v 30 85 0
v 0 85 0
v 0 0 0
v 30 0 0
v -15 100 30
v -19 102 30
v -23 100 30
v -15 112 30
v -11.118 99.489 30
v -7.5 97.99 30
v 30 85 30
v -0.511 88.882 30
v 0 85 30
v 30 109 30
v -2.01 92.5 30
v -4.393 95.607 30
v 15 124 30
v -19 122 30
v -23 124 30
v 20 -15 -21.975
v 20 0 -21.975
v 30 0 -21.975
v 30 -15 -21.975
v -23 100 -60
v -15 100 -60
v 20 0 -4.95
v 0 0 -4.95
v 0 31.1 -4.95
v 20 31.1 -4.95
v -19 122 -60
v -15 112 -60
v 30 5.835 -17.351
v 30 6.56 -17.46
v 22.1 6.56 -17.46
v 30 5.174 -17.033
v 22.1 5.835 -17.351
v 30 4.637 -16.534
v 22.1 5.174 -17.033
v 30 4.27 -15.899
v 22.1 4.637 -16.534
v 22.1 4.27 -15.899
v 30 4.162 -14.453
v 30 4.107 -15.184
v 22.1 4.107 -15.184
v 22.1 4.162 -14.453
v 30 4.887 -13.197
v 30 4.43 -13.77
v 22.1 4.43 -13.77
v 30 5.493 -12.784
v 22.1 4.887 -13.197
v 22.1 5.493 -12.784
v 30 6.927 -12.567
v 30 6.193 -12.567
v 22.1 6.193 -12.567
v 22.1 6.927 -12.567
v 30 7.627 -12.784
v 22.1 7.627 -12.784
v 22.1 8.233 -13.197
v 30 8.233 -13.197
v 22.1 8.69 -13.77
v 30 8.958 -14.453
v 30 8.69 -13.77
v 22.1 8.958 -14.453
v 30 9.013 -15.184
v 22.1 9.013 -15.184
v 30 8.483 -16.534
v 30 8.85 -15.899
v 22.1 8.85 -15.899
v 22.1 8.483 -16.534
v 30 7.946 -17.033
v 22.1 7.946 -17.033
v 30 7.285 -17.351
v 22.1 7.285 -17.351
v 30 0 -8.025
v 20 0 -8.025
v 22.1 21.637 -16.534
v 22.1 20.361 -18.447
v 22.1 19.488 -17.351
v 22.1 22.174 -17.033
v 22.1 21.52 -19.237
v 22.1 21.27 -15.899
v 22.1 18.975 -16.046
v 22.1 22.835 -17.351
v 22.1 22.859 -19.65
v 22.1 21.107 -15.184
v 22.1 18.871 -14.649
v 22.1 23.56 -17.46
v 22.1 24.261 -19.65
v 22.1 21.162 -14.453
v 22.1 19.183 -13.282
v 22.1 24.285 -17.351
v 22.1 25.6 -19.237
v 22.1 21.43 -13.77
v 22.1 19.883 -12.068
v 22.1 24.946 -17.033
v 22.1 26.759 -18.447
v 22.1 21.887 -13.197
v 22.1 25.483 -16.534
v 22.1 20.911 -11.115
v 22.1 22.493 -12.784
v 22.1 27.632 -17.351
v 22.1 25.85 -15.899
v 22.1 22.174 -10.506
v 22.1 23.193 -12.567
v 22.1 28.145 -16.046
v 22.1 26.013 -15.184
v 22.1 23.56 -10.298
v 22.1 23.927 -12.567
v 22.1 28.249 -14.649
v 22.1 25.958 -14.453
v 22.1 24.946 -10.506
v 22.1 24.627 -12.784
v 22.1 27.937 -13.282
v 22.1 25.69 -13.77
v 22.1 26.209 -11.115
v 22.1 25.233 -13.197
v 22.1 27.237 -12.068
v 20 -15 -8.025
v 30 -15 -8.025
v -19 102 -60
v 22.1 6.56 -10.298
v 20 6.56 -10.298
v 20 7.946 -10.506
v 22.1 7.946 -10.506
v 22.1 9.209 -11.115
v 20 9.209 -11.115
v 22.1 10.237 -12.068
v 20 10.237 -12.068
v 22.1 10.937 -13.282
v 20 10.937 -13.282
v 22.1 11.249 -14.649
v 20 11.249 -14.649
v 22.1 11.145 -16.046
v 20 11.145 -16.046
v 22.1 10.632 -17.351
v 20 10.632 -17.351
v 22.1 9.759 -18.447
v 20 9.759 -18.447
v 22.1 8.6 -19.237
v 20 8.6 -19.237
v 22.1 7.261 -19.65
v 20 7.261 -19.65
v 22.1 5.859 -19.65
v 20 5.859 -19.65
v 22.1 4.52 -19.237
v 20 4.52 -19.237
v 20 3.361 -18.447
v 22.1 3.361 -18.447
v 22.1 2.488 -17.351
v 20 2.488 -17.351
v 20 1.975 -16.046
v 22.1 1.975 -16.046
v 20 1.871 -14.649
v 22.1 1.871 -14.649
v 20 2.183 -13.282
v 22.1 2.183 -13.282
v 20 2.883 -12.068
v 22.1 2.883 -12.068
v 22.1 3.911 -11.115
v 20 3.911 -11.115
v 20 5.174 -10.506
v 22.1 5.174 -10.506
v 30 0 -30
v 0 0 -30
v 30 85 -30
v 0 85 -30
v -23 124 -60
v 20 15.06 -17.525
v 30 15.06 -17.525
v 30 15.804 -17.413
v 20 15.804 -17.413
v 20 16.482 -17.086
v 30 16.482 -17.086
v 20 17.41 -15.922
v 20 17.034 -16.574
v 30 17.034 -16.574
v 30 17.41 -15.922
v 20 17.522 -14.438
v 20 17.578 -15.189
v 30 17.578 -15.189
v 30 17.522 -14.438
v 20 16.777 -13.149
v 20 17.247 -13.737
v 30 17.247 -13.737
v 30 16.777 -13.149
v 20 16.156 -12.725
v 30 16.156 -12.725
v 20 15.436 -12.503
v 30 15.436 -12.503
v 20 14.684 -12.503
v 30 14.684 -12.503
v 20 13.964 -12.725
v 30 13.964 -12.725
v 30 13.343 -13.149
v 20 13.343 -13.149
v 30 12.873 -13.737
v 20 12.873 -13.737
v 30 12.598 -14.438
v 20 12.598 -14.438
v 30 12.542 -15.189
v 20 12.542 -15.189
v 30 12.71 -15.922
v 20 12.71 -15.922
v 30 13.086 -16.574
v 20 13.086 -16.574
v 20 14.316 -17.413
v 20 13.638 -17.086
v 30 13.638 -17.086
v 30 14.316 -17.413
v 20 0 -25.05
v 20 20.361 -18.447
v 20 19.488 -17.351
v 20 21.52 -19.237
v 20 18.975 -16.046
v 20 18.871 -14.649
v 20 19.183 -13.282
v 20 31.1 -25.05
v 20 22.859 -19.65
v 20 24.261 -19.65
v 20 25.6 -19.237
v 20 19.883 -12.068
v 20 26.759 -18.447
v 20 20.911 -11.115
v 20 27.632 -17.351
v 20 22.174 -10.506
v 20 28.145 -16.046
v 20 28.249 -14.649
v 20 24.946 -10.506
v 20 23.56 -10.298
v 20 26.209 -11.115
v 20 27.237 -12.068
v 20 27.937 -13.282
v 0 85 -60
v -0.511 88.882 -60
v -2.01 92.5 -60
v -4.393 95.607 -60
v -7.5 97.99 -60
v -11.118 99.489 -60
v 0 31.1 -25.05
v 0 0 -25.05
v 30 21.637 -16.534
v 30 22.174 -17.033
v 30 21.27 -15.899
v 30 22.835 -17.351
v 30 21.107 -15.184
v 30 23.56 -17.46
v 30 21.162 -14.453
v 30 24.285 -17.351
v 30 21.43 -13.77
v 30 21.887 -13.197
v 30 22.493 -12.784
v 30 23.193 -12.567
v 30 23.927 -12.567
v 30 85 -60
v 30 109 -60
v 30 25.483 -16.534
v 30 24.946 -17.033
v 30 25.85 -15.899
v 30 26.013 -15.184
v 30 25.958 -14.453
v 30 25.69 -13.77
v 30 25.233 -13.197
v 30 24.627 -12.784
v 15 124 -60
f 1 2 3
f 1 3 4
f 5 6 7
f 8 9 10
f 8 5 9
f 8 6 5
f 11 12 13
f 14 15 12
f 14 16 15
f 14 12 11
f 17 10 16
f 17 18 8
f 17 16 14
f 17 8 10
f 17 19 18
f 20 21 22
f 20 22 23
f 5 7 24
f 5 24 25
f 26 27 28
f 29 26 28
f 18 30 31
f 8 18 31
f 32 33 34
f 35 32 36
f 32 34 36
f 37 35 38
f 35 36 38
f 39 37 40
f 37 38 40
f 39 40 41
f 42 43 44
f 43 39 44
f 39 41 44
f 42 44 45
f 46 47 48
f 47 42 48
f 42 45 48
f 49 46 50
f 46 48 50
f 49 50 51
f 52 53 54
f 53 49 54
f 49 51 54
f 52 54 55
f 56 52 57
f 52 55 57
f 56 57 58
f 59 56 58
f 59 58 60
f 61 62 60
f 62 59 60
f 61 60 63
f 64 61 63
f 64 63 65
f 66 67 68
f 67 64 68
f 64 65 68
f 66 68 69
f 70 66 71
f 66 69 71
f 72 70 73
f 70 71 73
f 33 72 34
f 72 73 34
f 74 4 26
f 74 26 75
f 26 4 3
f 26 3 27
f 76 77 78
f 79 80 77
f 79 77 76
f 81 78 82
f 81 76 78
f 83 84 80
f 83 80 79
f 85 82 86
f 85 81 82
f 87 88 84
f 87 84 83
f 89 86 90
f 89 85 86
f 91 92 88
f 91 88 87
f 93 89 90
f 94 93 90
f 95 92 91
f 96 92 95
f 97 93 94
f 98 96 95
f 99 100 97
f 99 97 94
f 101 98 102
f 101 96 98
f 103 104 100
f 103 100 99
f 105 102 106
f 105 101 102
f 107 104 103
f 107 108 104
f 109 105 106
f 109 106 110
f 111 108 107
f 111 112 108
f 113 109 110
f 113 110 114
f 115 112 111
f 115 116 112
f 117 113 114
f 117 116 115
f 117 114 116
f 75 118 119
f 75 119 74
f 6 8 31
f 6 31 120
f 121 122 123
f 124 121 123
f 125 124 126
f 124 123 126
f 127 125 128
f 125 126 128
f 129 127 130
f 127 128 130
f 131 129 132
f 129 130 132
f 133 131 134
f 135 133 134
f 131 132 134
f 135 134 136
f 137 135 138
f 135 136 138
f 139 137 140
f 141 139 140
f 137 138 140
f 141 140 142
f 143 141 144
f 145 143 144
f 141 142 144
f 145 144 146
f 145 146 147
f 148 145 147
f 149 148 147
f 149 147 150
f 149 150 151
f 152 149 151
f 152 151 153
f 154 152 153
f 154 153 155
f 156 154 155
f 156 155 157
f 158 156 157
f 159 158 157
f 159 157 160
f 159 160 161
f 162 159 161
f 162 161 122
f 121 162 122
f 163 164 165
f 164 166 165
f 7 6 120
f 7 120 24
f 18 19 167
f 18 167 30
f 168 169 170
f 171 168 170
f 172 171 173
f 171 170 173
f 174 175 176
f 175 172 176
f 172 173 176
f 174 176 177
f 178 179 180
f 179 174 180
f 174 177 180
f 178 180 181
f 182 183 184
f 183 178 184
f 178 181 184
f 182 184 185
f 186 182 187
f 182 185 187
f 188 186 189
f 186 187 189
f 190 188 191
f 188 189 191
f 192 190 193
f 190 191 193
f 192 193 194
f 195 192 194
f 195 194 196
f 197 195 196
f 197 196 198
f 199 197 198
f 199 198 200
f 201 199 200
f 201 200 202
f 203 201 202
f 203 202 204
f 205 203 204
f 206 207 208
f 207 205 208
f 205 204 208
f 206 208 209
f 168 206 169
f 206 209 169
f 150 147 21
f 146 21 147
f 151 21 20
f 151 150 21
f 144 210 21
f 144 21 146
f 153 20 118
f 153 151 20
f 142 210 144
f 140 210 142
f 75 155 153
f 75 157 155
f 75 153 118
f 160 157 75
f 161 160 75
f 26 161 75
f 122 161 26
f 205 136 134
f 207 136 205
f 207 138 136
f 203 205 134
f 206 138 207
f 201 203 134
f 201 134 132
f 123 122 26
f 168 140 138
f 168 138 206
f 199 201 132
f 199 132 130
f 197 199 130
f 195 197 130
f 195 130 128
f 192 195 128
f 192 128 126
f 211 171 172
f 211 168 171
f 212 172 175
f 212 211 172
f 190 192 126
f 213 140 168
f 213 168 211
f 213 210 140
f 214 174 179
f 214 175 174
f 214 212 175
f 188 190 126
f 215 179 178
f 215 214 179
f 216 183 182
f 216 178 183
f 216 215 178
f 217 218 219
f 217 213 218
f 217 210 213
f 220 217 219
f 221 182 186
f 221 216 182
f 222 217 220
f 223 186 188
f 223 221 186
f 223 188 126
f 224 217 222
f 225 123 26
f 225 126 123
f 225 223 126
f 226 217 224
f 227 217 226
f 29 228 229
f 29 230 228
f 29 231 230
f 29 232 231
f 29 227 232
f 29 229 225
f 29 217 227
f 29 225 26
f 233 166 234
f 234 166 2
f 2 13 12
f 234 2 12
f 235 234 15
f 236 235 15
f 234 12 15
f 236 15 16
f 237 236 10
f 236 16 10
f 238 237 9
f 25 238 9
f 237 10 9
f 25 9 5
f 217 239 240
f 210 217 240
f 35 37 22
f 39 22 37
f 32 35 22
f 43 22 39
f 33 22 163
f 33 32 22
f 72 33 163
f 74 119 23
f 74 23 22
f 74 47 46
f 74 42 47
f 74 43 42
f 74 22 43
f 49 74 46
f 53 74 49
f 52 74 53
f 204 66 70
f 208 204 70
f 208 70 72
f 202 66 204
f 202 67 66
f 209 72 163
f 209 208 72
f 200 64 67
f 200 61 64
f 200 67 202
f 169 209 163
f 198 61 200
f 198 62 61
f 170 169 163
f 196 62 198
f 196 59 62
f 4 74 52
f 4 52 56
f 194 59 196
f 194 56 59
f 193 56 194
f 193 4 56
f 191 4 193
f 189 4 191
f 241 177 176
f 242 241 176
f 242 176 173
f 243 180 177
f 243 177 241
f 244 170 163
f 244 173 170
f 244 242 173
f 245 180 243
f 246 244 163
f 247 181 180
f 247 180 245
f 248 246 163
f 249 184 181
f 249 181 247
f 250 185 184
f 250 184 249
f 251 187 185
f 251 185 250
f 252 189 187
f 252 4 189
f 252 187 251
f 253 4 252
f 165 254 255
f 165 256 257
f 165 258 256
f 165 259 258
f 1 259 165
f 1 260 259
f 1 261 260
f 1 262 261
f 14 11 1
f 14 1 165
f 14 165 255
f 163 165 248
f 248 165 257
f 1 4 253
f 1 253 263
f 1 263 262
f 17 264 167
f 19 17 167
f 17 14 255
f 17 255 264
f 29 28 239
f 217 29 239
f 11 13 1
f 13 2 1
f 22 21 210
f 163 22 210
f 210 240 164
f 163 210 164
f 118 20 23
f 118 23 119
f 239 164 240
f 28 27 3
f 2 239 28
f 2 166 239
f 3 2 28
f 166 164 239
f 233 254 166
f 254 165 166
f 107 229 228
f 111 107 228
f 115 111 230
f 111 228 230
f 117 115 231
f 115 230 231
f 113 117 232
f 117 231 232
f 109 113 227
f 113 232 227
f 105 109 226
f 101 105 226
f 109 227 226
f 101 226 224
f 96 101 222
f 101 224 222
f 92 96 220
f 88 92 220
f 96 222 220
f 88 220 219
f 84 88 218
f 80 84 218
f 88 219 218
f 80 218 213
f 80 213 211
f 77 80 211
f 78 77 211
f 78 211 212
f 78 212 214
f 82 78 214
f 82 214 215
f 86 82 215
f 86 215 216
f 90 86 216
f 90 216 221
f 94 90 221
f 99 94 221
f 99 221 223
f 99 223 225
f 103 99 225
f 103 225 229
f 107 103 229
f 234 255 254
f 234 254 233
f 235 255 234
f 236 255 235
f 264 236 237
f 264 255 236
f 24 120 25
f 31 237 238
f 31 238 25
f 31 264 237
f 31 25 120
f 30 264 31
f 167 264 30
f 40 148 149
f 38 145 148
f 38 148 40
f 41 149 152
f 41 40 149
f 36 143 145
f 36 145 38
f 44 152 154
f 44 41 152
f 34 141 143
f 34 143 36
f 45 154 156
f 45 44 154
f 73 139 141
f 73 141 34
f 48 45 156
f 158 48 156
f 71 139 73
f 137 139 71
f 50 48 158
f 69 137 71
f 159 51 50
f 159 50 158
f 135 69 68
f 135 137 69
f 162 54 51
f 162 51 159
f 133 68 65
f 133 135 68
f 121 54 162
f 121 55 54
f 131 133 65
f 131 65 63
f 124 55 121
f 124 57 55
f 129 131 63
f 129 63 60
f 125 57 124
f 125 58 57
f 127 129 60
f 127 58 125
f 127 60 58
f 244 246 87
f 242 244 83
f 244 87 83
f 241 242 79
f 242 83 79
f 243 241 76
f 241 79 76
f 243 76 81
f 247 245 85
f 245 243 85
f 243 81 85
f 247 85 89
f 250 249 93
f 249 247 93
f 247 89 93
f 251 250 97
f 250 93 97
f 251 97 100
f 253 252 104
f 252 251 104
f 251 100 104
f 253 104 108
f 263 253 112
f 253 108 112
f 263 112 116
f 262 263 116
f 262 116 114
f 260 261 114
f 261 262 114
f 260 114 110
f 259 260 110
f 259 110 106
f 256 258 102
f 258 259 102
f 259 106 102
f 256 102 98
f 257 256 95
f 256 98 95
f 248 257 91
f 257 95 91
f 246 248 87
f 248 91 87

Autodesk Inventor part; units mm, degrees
ref_plane "YZ Plane" through (0, 0, 0) normal (1, 0, 0) x (0, 1, 0)
ref_plane "XZ Plane" through (0, 0, 0) normal (0, 1, 0) x (-1, 0, 0)
sketch "Sketch1" plane through (0, 0, 0) normal (0, 0, 1) x (1, 0, 0)
  line L0 (0, 0) -> (25, 0)
  line L1 (25, 0) -> (25, 40)
  line L2 (25, 40) -> (0, 40)
  line L3 (0, 40) -> (0, 0)
  dimension "d1" = 25
  dimension "d2" = 40
  dimension "d3" = 25
extrude "Extrusion1" add sketch "Sketch1" against normal blind 30
sketch "Sketch2" plane through (25, 0, 0) normal (1, 0, 0) x (0, 0, -1)
  line L0 (0, 0) -> (30, 0) projected
  circle A0 centre (15, 6.56) radius 2.46
extrude "Extrusion2" cut sketch "Sketch2" against normal blind 30
sketch "Sketch3" plane through (0, 0, 0) normal (-1, 0, 0) x (0, 0, 1)
  line L0 (0, 0) -> (-30, 0) projected
  line L1 (-25.05, 0) -> (-4.95, 0)
  line L2 (-4.95, 0) -> (-4.95, 33.12)
  line L3 (-4.95, 33.12) -> (-25.05, 33.12)
  line L4 (-25.05, 33.12) -> (-25.05, 0)
  dimension "d11" = 20.1
extrude "Extrusion3" cut sketch "Sketch3" against normal blind 20
sketch "Sketch4" plane through (0, 0, 0) normal (0, -1, 0) x (1, 0, 0)
  line L0 (20, -4.95) -> (20, -25.05) projected
  line L1 (20, -15) -> (25, -15)
  line L2 (25, 0) -> (25, -30) projected
  line L3 (20, -8.025) -> (25, -8.025)
  line L4 (25, -8.025) -> (25, -21.975)
  line L5 (25, -21.975) -> (20, -21.975)
  line L6 (20, -21.975) -> (20, -8.025)
  line L7 (20, -8.025) -> (25, -21.975) construction
  line L8 (25, -8.025) -> (20, -21.975) construction
  line L9 (25, -12.54) -> (25, -17.46) projected
  point P0 (0, 0)
  point P1 (22.5, -15)
  dimension "d14" = 13.95
extrude "Extrusion4" add sketch "Sketch4" along normal blind 15
sketch "Sketch5" plane through (20, 0, 0) normal (-1, 0, 0) x (0, 0, 1)
  circle A0 centre (-15, 6.56) radius 2.46 projected
  circle A1 centre (-15, 6.56) radius 4.7025
  circle A2 centre (-15, 6.56) radius 2.46 projected
  circle A3 centre (-15, 6.56) radius 2.46
  point P0 (0, 0)
  dimension "d17" = 9.405
extrude "Extrusion5" cut sketch "Sketch5" against normal blind 2.1
sketch "Sketch6" plane through (25, 0, 0) normal (1, 0, 0) x (0, 0, -1)
  circle A0 centre (15, 6.56) radius 4.7025 projected
  line L0 (15, 6.56) -> (15, 23.56)
  circle A1 centre (15, 23.56) radius 2.46
  point P0 (0, 0)
  dimension "d20" = 17
  dimension "d21" = 4.92
extrude "Extrusion6" cut sketch "Sketch6" against normal blind 10 contours A1
sketch "Sketch7" plane through (20, 0, 0) normal (-1, 0, 0) x (0, 0, 1)
  circle A0 centre (-15, 23.56) radius 2.46 projected
  circle A1 centre (-15, 23.56) radius 4.7025
  point P0 (0, 0)
  dimension "d24" = 9.405
extrude "Extrusion7" cut sketch "Sketch7" against normal blind 2.1
sketch "Sketch9" plane through (25, 0, 0) normal (1, 0, 0) x (0, 0, -1)
  circle A0 centre (15, 6.56) radius 2.46 projected
  circle A1 centre (15, 6.56) radius 2.46
  circle A2 centre (15, 23.56) radius 2.46 projected
  circle A3 centre (15, 23.56) radius 2.46
  line L0 (30, 40) -> (30, 0) projected
  line L1 (30, 0) -> (30, 40)
  line L2 (30, 40) -> (0, 40)
  line L3 (0, 40) -> (0, 0)
  line L4 (0, 0) -> (8.025, 0) projected
  line L5 (21.975, 0) -> (21.975, -15)
  line L6 (21.975, -15) -> (8.025, -15)
  line L7 (8.025, -15) -> (8.025, 0)
  line L8 (0, 0) -> (8.025, 0)
  line L9 (21.975, 0) -> (30, 0)
extrude "Extrusion8" add sketch "Sketch9" along normal blind 5
sketch "Sketch10" plane through (0, 40, 0) normal (0, 1, 0) x (1, 0, 0)
  line L0 (0, 30) -> (30, 30) projected
  line L1 (30, 0) -> (0, 0) projected
  line L2 (0, 30) -> (30, 30)
  line L3 (30, 30) -> (30, 0)
  line L4 (30, 0) -> (0, 0)
  line L5 (0, 0) -> (0, 30)
extrude "Extrusion9" add sketch "Sketch10" along normal blind 30
sketch "Sketch12" plane through (30, 0, 0) normal (1, 0, 0) x (0, 0, -1)
  circle A0 centre (15, 6.56) radius 2.46 projected
  line L0 (15, 6.56) -> (15, 15.06)
  circle A1 centre (15, 15.06) radius 2.525
  point P0 (0, 0)
  dimension "d31" = 8.5
  dimension "d33" = 5.05
extrude "Extrusion10" cut sketch "Sketch12" against normal blind 30 contours A1
sketch "Sketch14" plane through (0, 0, 0) normal (0, 0, 1) x (1, 0, 0)
  line L0 (30, 70) -> (0, 70) projected
  line L1 (0, 70) -> (0, 85)
  line L2 (-15, 100) -> (-23, 100)
  line L3 (30, 0) -> (30, 70) projected
  line L4 (30, 109) -> (30, 70)
  arc A0 (0, 85) -> (-15, 100) centre (-15, 85) ccw
  line L5 (30, 105) -> (30, 100)
  line L6 (-23, 124) -> (15, 124)
  line L7 (-19, 122) -> (-23, 124)
  line L8 (-19, 122) -> (-15, 112)
  line L9 (-19, 102) -> (-23, 100)
  line L10 (-19, 102) -> (-15, 112)
  line L11 (30, 109) -> (15, 124)
  point P0 (0, 0)
  point P1 (0, 100)
  dimension "d47" = 30
  dimension "d54" = 15
extrude "Extrusion12" add sketch "Sketch14" against normal blind 30
sketch "Sketch15" plane through (0, 0, -25.05) normal (-1, 0, 0) x (0, 0, 1)
  line L0 (0, 33.12) -> (20.1, 33.12) projected
  line L1 (20.1, 33.12) -> (20.1, 0) projected
  line L2 (0, 33.12) -> (20.1, 33.12)
  line L3 (20.1, 33.12) -> (20.1, 31.1)
  line L4 (20.1, 31.1) -> (0, 31.1)
  line L5 (0, 31.1) -> (0, 33.12)
  point P0 (25.05, 0)
  dimension "d57" = 2.02
extrude "Extrusion13" add sketch "Sketch15" against normal blind 20
sketch "Sketch19" plane through (0, 0, 0) normal (0, 0, 1) x (1, 0, 0)
  arc A0 (0, 85) -> (-15, 100) centre (-15, 85) ccw projected
  arc A1 (0, 85) -> (-15, 100) centre (-15, 85) ccw
  line L0 (-15, 100) -> (-23, 100) projected
  line L1 (-15, 100) -> (-23, 100)
  line L2 (-23, 100) -> (-19, 102) projected
  line L3 (-23, 100) -> (-19, 102)
  line L4 (-19, 102) -> (-15, 112) projected
  line L5 (-19, 102) -> (-15, 112)
  line L6 (-15, 112) -> (-19, 122) projected
  line L7 (-15, 112) -> (-19, 122)
  line L8 (-19, 122) -> (-23, 124) projected
  line L9 (-19, 122) -> (-23, 124)
  line L10 (-23, 124) -> (15, 124) projected
  line L11 (-23, 124) -> (15, 124)
  line L12 (15, 124) -> (30, 109) projected
  line L13 (15, 124) -> (30, 109)
  line L14 (30, 109) -> (30, 85)
  line L15 (30, 0) -> (30, 109) projected
  line L16 (0, 85) -> (30, 85)
  point P0 (0, 0)
extrude "Extrusion14" add sketch "Sketch19" along normal blind 30
ref_plane "Work Plane1" through (0, 0, -15) normal (0, 0, 1) x (1, 0, 0)
mirror "Mirror1" about plane through (0, 0, -15) normal (0, 0, 1) of "Extrusion14"
properties part number "20mm_x_90mm"
